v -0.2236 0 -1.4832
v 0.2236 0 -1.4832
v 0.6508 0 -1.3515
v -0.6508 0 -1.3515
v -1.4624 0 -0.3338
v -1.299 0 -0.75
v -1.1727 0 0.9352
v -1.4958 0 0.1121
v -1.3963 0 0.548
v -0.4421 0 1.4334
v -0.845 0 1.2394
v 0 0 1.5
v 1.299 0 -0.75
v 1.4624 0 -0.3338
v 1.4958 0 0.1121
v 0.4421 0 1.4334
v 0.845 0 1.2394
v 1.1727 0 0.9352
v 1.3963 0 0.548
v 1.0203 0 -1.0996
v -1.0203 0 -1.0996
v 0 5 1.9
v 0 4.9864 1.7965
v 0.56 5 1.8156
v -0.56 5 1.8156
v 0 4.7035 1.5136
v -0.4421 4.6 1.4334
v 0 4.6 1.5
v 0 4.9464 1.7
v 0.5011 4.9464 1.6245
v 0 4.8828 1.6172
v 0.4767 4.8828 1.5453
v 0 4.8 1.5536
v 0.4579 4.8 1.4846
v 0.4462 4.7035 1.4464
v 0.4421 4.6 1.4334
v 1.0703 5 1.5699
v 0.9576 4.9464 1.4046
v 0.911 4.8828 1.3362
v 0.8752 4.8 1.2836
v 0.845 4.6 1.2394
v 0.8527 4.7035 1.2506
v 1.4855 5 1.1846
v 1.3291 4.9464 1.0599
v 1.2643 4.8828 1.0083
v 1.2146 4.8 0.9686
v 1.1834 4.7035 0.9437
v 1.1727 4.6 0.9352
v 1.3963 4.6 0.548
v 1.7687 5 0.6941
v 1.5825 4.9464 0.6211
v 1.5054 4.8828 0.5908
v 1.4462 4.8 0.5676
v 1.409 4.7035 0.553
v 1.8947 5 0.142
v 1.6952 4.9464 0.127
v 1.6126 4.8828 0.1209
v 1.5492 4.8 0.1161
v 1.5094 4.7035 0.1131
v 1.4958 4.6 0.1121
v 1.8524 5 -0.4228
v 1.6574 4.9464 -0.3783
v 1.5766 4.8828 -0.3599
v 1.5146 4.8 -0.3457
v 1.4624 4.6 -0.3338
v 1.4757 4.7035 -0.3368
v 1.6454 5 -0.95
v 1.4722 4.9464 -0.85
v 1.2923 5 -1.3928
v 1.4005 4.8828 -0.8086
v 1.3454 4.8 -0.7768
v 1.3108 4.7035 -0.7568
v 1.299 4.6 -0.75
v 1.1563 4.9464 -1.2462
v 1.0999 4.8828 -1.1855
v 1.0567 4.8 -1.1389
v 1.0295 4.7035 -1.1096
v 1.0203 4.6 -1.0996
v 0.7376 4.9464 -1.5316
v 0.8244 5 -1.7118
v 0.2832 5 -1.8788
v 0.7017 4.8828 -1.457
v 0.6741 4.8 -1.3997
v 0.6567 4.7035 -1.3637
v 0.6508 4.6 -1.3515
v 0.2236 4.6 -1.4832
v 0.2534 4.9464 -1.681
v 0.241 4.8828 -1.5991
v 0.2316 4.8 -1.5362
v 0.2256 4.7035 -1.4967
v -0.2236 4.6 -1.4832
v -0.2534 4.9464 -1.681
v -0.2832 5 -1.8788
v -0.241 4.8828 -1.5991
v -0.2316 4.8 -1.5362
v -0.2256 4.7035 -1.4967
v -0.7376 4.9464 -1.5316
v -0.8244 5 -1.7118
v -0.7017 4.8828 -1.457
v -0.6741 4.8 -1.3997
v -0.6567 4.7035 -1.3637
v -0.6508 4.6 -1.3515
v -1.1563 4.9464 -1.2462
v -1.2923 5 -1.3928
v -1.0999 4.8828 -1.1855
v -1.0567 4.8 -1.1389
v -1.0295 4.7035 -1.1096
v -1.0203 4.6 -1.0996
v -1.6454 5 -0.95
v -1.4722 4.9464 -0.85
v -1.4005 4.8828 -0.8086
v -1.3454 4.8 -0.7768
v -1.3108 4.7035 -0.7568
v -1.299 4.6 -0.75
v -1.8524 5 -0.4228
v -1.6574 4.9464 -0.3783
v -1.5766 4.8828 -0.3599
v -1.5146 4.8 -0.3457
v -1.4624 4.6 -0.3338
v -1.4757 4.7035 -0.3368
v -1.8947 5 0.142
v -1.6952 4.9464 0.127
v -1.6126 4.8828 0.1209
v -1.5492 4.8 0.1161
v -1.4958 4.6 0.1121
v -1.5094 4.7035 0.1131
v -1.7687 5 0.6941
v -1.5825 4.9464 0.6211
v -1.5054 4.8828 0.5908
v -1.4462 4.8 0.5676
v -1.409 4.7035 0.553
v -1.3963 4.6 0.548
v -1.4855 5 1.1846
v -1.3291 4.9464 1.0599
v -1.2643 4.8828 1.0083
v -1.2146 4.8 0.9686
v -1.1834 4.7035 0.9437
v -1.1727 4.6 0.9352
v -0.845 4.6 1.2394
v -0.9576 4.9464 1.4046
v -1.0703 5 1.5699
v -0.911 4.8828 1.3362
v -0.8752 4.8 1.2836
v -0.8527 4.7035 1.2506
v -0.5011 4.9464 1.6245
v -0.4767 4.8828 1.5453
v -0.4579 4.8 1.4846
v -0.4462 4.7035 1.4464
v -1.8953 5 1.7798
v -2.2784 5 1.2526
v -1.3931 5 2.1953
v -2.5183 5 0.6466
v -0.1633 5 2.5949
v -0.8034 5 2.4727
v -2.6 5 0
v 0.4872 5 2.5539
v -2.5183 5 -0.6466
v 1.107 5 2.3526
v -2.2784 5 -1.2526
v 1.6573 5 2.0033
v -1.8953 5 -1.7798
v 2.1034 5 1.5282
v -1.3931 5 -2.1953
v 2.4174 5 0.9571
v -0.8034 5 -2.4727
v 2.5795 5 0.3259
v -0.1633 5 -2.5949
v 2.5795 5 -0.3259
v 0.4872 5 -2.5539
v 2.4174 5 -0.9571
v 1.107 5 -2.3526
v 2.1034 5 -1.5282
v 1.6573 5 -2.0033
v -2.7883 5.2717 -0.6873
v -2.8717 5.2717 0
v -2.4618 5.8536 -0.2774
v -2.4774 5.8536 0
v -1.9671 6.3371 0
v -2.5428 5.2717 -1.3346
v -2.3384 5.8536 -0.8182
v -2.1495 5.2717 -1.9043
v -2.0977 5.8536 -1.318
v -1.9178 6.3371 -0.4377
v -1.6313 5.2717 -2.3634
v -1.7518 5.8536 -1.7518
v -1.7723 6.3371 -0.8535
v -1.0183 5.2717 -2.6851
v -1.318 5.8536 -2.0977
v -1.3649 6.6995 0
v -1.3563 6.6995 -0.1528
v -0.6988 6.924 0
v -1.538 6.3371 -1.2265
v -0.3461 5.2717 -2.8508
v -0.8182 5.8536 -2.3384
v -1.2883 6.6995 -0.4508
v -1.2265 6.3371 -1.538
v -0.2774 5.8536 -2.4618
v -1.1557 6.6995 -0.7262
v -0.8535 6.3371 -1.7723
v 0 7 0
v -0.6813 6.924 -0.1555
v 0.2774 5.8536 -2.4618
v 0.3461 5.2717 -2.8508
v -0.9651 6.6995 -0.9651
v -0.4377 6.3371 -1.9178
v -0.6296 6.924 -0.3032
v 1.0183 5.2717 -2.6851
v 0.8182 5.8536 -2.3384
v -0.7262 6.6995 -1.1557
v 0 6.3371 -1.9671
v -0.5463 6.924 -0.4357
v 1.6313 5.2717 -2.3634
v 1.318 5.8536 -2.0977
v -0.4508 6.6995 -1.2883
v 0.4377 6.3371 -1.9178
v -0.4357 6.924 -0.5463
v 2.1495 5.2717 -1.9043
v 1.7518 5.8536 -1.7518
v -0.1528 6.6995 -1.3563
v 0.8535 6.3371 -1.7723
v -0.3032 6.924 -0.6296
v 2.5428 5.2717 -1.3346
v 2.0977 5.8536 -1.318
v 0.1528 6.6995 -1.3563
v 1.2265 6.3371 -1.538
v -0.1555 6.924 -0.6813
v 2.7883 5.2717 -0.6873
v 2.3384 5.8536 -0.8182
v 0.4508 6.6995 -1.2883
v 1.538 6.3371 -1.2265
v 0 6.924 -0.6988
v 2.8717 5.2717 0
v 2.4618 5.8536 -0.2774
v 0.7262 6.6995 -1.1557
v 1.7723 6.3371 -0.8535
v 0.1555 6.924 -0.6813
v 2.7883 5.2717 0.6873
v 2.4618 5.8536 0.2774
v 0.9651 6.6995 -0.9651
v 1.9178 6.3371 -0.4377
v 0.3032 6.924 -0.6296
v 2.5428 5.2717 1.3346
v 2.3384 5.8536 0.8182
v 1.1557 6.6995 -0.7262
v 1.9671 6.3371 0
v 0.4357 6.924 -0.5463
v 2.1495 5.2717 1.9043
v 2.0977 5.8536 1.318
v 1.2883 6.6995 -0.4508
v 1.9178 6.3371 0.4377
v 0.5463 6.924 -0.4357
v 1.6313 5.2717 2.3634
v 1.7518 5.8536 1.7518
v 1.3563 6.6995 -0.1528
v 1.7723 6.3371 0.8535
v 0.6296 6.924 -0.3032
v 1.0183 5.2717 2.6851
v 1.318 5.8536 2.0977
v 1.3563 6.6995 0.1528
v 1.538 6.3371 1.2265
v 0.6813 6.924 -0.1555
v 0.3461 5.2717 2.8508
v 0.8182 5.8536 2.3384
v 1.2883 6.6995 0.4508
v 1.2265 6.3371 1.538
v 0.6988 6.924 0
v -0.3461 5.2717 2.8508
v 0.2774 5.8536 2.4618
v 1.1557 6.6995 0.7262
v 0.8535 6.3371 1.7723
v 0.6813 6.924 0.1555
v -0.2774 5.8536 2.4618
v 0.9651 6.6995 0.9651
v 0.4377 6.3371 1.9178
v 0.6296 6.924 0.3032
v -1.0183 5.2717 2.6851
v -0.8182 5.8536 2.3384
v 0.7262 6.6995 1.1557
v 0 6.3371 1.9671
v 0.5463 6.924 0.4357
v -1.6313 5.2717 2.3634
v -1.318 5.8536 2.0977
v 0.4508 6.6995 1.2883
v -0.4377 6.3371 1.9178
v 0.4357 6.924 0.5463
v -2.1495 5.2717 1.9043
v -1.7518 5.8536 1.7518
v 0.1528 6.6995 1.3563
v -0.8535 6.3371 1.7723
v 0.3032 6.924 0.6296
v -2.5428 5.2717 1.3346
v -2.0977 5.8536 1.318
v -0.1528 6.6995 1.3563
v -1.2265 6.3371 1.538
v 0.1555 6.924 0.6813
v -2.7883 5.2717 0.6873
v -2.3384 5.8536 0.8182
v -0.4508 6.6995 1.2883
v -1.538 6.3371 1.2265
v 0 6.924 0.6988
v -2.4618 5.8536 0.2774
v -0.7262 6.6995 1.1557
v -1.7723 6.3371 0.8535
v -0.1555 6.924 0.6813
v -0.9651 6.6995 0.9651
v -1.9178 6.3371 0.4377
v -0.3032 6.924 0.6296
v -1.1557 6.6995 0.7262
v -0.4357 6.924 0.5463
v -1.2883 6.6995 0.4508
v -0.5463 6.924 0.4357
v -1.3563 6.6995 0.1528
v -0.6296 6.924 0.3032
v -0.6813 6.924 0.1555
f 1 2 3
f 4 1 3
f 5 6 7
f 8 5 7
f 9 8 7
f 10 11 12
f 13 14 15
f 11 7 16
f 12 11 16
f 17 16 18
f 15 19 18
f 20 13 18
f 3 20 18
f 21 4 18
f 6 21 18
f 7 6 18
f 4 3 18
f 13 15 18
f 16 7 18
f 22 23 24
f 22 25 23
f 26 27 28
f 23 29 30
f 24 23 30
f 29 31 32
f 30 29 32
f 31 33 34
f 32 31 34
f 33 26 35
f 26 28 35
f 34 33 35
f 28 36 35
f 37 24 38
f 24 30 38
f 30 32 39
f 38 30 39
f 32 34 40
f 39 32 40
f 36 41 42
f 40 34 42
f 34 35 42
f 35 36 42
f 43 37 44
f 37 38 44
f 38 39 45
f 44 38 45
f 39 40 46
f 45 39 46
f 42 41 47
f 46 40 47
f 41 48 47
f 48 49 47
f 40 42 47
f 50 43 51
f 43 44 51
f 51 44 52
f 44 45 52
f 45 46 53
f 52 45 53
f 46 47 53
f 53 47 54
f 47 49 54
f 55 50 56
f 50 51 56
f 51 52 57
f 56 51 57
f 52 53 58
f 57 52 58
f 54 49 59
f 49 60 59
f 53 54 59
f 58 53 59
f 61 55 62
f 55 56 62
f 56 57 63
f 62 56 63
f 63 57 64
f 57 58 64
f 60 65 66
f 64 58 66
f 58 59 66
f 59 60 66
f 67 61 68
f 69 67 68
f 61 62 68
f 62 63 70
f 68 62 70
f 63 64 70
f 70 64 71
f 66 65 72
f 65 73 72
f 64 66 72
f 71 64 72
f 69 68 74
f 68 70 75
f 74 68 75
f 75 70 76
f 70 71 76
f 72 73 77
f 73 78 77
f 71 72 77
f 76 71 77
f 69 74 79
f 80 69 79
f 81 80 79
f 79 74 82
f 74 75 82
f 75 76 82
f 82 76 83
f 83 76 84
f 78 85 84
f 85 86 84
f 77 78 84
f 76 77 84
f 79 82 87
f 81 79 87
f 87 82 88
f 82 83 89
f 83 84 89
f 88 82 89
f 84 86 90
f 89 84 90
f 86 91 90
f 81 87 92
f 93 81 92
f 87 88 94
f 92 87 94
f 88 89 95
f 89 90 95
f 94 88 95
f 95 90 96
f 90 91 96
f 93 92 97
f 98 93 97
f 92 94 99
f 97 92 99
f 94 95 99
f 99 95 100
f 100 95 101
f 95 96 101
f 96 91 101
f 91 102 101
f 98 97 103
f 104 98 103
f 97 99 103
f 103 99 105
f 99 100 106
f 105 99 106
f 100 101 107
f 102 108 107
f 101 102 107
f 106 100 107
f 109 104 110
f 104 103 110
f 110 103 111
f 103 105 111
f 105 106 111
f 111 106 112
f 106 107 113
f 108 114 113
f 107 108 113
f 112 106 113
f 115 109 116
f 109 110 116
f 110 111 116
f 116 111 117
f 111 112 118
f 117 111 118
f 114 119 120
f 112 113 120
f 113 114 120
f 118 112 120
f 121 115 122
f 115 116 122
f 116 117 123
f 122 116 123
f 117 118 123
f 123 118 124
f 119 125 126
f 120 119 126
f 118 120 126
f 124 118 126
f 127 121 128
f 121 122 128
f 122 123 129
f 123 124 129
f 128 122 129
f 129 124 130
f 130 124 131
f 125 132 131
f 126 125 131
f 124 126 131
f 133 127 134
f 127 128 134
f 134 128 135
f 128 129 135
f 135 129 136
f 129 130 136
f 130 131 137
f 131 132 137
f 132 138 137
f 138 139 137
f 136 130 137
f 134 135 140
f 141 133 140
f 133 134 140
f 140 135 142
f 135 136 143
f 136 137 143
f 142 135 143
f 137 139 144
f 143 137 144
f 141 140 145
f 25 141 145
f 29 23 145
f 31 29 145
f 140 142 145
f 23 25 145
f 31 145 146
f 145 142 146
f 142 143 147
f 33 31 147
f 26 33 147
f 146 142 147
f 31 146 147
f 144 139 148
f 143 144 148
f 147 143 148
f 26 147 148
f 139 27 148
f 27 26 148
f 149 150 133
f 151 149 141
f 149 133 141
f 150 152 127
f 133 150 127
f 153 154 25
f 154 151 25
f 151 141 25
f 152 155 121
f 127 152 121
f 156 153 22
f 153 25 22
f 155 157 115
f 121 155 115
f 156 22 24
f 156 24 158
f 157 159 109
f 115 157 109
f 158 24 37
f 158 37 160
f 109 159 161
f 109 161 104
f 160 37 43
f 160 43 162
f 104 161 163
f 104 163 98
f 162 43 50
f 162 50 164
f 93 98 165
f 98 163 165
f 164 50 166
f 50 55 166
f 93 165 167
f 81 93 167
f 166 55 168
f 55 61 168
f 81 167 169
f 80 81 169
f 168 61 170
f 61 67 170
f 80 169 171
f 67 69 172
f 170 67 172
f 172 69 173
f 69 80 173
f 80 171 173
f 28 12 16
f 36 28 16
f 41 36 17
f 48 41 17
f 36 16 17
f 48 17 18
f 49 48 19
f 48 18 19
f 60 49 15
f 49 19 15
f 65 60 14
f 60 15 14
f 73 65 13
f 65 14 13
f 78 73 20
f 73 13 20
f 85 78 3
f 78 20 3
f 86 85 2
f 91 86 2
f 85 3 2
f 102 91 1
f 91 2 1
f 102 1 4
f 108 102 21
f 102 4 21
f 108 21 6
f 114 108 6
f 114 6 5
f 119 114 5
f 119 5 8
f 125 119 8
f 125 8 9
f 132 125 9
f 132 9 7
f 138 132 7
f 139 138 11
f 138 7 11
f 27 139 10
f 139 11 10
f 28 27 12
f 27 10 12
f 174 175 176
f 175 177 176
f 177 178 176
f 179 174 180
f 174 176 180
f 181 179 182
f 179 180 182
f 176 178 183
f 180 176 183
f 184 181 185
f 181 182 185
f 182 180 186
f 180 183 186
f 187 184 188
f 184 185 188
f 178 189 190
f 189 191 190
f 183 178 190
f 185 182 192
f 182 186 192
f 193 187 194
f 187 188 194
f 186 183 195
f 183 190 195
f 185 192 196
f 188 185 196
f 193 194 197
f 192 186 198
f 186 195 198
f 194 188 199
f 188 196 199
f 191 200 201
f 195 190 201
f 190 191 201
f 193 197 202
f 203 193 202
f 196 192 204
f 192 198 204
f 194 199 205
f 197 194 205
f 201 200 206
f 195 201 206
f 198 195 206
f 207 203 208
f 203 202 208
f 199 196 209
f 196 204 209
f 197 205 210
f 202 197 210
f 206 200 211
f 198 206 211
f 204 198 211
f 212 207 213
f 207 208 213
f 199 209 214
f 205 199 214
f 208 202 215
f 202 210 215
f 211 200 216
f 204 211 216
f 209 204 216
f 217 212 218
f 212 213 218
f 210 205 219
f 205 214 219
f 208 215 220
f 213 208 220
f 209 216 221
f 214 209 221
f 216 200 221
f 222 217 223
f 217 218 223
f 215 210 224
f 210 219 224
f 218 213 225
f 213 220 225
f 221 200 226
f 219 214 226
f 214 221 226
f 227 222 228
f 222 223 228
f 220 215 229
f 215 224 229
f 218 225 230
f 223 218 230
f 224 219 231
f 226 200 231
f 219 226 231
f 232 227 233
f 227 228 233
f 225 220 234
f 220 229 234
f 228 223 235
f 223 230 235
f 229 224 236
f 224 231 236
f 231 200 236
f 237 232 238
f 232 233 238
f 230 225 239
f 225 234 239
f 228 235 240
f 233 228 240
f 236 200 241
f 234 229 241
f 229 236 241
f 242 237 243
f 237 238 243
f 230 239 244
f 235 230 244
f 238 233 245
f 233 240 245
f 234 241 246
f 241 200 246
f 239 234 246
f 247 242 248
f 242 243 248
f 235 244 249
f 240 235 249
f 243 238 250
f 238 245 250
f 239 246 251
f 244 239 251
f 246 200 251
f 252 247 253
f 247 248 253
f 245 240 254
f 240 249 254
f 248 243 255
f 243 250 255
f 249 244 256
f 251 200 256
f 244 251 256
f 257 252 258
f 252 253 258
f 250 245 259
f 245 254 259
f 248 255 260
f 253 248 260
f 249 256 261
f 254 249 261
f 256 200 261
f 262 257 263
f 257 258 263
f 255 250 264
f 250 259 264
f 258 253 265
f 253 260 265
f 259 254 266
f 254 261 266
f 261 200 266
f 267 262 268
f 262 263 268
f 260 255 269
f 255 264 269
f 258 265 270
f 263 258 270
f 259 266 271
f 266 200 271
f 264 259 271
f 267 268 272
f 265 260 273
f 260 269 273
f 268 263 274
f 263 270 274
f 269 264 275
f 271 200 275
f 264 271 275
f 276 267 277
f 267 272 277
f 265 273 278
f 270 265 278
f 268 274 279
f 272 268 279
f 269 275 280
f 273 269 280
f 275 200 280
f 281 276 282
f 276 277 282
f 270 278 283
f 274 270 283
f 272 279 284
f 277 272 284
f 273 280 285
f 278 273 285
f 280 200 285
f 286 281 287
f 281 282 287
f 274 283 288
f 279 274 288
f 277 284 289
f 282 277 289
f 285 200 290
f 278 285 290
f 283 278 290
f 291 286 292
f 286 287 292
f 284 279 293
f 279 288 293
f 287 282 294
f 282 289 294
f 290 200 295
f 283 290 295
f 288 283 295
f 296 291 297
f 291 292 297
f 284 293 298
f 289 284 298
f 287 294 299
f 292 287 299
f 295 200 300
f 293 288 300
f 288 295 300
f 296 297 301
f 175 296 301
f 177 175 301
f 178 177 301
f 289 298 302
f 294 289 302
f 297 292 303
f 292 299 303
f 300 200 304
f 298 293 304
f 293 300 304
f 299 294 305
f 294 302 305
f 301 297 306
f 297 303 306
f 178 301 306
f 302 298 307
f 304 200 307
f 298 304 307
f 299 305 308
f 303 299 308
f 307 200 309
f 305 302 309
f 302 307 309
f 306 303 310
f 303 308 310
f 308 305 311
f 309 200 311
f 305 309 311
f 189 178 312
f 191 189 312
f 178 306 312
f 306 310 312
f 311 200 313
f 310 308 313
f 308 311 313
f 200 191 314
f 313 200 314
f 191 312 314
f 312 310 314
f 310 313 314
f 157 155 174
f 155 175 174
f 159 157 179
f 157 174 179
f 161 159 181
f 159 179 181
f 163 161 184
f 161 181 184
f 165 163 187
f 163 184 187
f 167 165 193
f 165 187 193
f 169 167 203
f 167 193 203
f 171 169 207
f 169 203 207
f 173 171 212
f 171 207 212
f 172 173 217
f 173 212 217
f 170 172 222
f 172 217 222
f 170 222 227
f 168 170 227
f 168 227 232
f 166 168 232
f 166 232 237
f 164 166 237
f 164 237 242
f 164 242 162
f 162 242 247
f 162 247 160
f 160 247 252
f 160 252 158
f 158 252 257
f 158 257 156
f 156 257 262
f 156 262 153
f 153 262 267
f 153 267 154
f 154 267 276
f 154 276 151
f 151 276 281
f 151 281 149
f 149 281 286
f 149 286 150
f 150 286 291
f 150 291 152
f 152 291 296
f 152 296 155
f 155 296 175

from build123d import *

# Parameters (mm, degrees)
SKETCH1_R           = 1.5
BOSS_EXTRUDE1_DEPTH = 5
FILLET2_R           = 0.4
CHAMFER1_SIZE       = 0.4


with BuildPart() as part:
    # Sketch1 → Boss-Extrude1 (new body)
    with BuildSketch(Plane(origin=(0, 0, 0), x_dir=(1, 0, 0), z_dir=(0, 1, 0))):
        with Locations(Location((0, 0, 0), (0, 0, 270))):
            Circle(SKETCH1_R)
    extrude(amount=BOSS_EXTRUDE1_DEPTH)

    # Sketch3 → Revolve1 (revolve)
    with BuildSketch(Plane.XY):
        with BuildLine():
            Line((0, 5), (-3, 5))
            ThreePointArc((-3, 5), (-1.802775638, 6.454163457), (0, 7))
            Line((0, 7), (0, 5))
        make_face()
    revolve(axis=Axis((0, 7, 0), (0, -1, 0)))

    # Fillet2
    fillet2_edges = [part.edges().sort_by_distance(p)[0] for p in [
        (0, 5, -1.5),
    ]]
    fillet(fillet2_edges, radius=FILLET2_R)

    # Chamfer1
    # the kernel refuses this chamfer: 0.4, 0.305882353 mm, written as the material it takes off along each edge
    with BuildSketch(Plane(origin=(0, 5, 0), x_dir=(-1, 0, 0), z_dir=(0, 0, 1))) as chamfer1_piece_1:
        with BuildLine():
            Line((3 - CHAMFER1_SIZE, 0), (2.871730525, -0.271730525))
            ThreePointArc((2.871730525, -0.271730525), (2.93785488, -0.139787287), (3, 0))
            Line((3, 0), (3 - CHAMFER1_SIZE, 0))
        make_face()
    revolve(axis=Axis((0, 5, 0), (0, -1, 0)), mode=Mode.SUBTRACT)


solid = part.part
